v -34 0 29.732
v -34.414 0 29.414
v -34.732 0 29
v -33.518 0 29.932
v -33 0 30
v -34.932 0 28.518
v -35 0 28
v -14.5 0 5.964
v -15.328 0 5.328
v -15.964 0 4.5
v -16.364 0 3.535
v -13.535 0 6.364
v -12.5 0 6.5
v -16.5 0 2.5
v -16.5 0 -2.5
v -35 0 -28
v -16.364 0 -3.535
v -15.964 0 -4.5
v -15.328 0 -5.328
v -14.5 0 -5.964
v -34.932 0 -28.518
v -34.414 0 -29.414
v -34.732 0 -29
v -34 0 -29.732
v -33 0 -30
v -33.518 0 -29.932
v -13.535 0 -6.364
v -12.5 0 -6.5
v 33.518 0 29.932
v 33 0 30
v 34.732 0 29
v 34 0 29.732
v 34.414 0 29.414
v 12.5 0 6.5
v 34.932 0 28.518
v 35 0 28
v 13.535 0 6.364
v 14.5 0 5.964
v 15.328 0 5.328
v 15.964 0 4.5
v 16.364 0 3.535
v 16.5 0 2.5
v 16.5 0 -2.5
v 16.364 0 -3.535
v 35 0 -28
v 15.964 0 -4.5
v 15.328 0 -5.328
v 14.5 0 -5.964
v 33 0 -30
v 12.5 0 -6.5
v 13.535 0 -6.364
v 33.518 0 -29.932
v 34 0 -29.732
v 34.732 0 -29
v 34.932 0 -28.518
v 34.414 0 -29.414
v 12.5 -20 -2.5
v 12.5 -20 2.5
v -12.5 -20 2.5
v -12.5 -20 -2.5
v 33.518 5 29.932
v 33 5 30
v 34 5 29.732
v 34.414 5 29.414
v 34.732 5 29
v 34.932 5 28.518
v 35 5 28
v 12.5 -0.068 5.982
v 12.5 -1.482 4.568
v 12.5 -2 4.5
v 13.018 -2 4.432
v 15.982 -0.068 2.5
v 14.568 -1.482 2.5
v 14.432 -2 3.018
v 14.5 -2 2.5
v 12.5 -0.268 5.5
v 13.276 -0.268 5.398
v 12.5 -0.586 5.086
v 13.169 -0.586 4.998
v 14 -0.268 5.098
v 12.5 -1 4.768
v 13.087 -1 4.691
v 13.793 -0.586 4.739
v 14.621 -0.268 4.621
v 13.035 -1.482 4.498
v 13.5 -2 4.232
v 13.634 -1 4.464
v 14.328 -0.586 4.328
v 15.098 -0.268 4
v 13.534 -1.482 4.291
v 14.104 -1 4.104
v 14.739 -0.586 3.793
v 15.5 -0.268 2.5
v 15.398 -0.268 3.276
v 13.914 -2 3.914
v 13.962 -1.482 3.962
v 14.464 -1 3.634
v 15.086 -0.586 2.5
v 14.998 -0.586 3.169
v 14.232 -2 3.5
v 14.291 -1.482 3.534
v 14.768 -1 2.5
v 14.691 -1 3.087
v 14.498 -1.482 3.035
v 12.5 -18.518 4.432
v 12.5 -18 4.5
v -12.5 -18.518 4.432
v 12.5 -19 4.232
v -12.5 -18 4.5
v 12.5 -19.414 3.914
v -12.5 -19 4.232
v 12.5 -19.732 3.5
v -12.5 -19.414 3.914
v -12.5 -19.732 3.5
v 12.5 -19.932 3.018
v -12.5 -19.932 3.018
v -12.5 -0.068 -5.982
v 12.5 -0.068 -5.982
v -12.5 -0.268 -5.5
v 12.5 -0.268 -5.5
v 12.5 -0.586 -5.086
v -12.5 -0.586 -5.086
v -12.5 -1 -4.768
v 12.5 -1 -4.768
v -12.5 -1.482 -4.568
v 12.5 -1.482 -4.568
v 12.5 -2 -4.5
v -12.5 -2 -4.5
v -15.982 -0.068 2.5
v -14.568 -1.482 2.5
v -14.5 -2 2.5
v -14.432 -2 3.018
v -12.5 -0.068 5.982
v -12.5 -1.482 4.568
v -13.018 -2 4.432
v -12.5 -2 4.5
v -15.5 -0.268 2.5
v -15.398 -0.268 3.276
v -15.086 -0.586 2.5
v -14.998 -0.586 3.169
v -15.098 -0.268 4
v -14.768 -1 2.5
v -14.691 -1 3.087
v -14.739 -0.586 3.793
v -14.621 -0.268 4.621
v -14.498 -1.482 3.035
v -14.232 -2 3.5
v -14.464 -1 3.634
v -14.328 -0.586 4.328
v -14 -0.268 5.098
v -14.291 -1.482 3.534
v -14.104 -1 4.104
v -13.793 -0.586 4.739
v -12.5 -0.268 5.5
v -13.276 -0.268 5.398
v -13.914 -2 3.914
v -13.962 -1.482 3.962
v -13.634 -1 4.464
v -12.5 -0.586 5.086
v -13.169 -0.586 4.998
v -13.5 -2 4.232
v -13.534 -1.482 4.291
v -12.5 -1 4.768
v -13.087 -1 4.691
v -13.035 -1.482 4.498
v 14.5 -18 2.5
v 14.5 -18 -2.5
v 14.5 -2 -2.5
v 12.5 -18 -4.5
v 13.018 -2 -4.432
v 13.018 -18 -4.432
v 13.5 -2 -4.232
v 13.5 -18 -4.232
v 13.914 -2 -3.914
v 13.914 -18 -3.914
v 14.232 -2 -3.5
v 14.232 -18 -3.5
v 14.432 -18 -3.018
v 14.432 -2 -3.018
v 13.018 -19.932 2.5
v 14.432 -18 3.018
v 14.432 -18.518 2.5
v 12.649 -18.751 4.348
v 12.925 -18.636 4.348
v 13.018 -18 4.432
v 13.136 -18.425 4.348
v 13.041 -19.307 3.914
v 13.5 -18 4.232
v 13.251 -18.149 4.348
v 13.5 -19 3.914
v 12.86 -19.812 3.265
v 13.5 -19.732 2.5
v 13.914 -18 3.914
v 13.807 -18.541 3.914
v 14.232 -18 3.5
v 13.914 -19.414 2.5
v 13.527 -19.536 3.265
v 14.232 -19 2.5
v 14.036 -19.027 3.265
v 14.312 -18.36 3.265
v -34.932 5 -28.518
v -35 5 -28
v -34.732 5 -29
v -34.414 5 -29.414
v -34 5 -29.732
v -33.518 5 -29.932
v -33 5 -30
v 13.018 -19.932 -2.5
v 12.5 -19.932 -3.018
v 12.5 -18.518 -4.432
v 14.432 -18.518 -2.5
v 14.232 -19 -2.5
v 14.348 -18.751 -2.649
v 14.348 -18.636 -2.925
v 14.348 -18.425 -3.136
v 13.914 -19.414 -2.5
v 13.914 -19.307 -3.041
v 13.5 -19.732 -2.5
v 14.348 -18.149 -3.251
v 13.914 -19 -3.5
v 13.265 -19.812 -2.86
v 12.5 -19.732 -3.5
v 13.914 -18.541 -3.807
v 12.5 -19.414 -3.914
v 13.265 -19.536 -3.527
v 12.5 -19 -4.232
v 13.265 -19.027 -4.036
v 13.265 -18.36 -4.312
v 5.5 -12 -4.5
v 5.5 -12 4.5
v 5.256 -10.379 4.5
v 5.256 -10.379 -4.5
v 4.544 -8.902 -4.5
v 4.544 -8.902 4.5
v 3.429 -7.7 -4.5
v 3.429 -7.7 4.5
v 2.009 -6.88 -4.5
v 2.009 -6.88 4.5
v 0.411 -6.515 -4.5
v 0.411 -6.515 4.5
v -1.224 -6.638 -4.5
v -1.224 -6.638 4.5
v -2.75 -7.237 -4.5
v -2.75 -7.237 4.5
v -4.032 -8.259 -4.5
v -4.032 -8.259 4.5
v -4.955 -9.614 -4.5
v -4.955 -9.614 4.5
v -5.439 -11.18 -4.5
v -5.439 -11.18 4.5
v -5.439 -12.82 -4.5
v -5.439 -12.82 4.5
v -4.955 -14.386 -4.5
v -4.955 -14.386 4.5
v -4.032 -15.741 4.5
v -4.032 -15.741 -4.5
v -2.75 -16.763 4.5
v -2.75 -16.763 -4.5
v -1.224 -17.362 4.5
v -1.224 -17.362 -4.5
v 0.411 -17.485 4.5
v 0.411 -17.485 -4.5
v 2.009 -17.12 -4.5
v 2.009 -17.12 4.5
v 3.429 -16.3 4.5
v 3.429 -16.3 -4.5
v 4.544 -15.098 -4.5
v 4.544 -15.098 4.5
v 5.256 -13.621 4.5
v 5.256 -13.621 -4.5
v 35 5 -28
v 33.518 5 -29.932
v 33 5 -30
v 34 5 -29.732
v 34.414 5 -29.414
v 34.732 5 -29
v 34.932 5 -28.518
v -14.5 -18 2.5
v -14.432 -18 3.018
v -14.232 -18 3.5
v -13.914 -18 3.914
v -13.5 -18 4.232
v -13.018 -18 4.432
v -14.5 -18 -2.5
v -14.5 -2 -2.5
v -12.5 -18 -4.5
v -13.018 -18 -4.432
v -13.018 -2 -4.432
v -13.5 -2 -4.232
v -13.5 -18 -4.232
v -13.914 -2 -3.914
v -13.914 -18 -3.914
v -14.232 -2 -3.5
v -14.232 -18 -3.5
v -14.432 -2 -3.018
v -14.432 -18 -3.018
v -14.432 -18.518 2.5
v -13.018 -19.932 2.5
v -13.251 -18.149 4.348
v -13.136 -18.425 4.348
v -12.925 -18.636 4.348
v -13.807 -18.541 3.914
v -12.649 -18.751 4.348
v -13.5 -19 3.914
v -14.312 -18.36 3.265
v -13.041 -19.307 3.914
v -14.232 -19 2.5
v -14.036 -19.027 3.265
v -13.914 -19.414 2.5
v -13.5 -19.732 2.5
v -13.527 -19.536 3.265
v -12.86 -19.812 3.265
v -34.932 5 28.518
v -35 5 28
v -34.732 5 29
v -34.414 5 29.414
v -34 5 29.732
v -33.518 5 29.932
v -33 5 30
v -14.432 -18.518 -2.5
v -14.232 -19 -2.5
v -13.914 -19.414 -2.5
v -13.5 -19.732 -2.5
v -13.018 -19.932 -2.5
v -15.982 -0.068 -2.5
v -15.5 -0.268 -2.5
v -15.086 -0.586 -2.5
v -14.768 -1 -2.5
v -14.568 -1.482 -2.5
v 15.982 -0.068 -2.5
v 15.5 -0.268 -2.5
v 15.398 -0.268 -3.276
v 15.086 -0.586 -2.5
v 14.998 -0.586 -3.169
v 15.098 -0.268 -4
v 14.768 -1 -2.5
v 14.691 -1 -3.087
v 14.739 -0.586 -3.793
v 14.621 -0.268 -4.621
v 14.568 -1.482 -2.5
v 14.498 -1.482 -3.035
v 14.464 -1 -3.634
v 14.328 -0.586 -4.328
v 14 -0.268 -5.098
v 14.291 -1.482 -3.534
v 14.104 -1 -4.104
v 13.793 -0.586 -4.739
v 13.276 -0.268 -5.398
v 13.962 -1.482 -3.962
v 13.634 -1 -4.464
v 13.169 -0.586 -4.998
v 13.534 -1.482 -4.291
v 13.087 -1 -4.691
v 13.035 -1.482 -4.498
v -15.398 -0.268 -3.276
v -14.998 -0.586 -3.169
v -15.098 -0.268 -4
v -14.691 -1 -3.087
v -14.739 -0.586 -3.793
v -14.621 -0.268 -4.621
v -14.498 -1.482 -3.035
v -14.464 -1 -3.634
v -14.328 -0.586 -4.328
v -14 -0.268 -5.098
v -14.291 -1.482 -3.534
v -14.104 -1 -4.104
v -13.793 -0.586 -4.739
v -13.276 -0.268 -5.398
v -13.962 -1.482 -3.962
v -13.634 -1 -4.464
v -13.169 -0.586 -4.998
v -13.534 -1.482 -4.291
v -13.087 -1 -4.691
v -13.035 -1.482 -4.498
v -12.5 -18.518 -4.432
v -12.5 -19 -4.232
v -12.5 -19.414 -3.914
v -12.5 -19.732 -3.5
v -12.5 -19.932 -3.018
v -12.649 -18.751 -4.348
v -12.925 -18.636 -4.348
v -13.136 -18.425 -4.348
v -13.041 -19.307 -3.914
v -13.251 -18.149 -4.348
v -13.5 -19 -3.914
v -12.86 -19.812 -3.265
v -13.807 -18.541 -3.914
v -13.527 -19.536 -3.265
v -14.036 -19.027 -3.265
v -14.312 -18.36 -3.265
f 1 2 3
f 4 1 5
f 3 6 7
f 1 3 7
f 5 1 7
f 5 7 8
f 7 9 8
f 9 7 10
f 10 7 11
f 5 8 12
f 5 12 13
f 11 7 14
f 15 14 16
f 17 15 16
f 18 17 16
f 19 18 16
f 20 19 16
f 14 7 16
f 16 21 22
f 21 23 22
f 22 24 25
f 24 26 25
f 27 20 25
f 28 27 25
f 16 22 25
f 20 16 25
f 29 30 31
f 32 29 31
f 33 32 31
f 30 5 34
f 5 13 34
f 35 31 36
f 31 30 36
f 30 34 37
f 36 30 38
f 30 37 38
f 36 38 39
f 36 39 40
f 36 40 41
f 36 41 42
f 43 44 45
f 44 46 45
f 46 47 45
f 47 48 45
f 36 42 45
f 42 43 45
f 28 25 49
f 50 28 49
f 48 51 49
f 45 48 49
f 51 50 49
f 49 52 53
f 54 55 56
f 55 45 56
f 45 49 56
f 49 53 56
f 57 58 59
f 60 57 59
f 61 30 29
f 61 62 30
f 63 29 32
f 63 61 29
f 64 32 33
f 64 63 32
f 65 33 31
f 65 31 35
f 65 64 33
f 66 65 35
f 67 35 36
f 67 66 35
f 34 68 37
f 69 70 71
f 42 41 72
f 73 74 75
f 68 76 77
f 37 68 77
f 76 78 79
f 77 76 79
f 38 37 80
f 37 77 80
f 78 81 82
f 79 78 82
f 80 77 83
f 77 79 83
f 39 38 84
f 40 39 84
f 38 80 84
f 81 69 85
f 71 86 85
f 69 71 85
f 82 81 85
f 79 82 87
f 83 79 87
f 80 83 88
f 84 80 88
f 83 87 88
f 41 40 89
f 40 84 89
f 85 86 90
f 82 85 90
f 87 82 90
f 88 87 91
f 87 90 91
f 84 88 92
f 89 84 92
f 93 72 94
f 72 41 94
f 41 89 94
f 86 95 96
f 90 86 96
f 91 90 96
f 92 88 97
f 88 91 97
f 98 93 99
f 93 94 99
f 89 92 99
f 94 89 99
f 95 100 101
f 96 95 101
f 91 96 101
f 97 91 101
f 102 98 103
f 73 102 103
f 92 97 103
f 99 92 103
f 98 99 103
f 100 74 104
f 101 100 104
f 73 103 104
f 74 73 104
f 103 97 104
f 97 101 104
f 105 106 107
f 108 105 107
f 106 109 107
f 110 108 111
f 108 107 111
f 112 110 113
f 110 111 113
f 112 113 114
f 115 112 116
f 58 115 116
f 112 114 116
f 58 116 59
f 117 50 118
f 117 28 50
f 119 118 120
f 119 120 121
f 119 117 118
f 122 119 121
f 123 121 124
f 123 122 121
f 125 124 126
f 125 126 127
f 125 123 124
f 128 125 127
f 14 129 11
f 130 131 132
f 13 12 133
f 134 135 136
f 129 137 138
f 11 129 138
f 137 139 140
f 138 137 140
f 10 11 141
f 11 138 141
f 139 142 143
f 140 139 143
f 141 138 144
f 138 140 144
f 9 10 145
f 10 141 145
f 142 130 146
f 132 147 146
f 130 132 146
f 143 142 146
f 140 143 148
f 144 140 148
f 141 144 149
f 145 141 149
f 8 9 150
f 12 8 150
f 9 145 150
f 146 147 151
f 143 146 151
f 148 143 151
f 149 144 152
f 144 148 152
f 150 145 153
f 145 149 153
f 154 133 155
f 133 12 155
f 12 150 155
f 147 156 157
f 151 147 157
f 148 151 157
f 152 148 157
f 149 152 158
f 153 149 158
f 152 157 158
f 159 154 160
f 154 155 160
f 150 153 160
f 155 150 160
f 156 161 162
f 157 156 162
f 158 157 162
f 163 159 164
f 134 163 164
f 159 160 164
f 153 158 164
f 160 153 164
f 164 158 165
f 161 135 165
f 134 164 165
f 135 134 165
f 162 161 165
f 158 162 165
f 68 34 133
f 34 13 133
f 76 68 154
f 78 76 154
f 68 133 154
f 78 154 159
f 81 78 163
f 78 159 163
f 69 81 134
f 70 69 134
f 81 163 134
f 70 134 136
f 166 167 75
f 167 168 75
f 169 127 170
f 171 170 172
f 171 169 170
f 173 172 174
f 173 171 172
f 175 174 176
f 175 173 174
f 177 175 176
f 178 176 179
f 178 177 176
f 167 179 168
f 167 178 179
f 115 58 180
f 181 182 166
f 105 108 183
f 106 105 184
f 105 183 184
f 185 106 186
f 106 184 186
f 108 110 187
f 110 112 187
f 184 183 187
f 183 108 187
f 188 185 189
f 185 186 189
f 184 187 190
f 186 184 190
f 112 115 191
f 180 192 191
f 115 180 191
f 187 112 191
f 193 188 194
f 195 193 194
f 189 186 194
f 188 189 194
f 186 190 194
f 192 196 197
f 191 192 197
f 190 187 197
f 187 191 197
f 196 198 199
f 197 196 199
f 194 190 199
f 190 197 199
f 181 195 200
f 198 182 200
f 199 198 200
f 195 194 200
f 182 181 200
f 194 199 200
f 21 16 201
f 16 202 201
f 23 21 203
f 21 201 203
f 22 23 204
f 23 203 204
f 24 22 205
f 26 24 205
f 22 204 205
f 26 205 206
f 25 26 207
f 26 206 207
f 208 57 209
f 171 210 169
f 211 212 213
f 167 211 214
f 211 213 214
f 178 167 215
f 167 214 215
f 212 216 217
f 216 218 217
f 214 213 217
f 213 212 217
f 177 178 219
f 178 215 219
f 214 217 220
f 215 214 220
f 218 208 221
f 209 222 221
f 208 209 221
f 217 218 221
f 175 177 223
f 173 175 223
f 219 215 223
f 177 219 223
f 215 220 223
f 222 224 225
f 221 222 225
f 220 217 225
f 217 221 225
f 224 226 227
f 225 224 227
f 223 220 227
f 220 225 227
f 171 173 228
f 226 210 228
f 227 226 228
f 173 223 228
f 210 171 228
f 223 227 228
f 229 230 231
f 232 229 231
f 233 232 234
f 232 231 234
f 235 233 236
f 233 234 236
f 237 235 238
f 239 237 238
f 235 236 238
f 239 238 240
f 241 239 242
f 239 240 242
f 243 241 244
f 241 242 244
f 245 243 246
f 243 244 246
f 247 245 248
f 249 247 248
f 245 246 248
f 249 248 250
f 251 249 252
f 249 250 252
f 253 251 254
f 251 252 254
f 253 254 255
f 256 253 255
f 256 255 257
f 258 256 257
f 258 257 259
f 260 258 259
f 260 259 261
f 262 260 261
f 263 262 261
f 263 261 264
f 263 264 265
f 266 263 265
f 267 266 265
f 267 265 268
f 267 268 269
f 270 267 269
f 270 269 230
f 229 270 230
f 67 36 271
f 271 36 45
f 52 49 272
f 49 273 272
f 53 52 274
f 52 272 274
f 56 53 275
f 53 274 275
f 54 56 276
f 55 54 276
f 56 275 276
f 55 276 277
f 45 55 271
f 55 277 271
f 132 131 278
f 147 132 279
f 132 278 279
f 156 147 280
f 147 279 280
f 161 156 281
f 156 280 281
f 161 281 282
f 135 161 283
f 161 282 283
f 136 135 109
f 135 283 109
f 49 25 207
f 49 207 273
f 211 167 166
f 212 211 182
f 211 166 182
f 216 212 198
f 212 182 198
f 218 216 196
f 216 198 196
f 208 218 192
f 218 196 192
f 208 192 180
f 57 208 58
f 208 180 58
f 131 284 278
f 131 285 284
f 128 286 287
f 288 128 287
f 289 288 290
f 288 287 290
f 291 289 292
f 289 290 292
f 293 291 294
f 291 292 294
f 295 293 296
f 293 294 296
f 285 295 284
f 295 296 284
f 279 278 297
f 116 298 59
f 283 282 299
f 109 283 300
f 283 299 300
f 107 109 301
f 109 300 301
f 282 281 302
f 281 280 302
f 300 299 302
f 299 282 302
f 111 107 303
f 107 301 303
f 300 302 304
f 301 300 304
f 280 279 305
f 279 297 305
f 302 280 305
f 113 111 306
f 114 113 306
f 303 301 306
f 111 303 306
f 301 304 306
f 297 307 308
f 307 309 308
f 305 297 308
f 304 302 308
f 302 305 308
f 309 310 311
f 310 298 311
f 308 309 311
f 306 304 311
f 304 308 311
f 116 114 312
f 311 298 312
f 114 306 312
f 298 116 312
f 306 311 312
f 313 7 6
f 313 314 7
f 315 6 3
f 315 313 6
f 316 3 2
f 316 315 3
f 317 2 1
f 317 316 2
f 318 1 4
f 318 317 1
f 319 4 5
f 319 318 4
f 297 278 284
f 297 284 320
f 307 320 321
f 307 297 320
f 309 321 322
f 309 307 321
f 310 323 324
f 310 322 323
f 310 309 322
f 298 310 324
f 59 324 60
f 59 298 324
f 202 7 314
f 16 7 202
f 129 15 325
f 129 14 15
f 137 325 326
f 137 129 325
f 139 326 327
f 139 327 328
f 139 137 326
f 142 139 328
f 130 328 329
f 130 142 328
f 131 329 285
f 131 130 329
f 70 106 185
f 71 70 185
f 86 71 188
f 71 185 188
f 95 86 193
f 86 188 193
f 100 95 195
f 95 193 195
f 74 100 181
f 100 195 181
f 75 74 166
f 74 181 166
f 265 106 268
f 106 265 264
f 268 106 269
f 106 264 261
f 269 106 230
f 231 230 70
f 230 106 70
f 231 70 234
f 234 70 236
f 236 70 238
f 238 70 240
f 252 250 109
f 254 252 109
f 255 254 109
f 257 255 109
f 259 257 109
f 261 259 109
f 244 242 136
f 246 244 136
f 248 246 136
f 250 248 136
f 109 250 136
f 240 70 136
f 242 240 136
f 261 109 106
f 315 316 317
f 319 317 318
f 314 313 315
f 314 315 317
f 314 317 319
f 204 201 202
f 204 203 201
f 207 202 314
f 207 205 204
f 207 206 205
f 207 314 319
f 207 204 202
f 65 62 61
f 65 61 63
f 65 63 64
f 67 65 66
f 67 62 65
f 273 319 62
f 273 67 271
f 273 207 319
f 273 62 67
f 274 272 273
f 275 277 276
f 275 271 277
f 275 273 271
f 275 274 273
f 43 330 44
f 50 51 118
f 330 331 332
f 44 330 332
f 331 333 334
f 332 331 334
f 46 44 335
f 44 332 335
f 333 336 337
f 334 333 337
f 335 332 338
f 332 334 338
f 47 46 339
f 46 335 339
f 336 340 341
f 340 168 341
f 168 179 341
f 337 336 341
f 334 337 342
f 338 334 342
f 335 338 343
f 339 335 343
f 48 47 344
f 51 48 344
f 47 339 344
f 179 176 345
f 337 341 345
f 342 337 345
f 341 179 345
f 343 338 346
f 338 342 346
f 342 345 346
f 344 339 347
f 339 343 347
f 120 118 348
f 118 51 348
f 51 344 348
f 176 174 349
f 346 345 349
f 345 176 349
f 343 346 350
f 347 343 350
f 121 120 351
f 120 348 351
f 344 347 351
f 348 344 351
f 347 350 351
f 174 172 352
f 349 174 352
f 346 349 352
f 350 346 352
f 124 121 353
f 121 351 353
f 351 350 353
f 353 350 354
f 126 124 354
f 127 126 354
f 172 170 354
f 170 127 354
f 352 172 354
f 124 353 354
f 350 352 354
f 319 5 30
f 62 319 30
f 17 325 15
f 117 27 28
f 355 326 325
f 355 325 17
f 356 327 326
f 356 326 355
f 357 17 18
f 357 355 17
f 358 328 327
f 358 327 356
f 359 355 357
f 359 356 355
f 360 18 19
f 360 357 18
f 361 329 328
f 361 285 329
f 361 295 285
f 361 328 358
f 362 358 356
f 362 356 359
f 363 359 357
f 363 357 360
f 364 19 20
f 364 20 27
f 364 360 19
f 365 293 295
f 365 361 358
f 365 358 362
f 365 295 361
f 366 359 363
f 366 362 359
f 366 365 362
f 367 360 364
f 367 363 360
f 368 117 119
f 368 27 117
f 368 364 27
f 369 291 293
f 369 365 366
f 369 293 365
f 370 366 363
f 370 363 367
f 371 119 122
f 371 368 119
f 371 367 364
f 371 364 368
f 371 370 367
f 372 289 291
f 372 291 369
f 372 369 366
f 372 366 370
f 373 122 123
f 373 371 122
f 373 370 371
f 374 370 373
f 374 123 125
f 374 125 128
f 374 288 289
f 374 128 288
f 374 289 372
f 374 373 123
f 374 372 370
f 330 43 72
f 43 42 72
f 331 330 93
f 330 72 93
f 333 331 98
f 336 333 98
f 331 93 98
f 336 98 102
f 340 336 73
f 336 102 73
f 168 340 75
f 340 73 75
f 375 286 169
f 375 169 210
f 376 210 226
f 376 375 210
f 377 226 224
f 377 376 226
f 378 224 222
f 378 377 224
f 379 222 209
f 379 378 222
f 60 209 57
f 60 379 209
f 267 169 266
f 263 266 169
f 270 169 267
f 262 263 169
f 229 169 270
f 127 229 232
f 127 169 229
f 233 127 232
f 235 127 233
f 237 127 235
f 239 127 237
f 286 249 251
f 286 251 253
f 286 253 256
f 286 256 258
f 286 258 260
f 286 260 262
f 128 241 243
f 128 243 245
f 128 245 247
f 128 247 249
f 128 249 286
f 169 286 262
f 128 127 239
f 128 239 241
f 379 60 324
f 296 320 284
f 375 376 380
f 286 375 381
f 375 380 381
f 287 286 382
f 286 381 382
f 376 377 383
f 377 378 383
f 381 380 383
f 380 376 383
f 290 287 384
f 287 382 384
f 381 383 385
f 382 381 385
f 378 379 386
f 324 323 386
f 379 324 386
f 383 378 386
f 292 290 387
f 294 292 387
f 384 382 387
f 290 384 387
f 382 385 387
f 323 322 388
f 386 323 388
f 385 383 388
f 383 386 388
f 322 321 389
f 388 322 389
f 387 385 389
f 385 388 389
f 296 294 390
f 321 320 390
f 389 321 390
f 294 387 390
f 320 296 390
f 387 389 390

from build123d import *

# Parameters (mm, degrees)
SKETCH1_W            = 70
SKETCH1_H            = 60
BOSS_EXTRUDE2_DEPTH  = 5
SKETCH15_W           = 29
SKETCH15_H           = 9
BOSS_EXTRUDE13_DEPTH = 20
SKETCH16_R           = 5.5
CUT_EXTRUDE3_DEPTH   = 54.058929503
FILLET1_R            = 2


with BuildPart() as part:
    # Sketch1 → Boss-Extrude2 (new body)
    with BuildSketch(Plane(origin=(0, 0, 0), x_dir=(1, 0, 0), z_dir=(0, 1, 0))):
        Rectangle(SKETCH1_W, SKETCH1_H)
    extrude(amount=BOSS_EXTRUDE2_DEPTH)

    # Sketch15 → Boss-Extrude13 (add)
    with BuildSketch(Plane(origin=(0, 0, 0), x_dir=(-1, 0, 0), z_dir=(0, 1, 0))):
        Rectangle(SKETCH15_W, SKETCH15_H)
    extrude(amount=-BOSS_EXTRUDE13_DEPTH)

    # Sketch16 → Cut-Extrude3 (cut, through all)
    with BuildSketch(Plane.XY.offset(4.5)):
        with Locations((0, -12)):
            Circle(SKETCH16_R)
    extrude(amount=-CUT_EXTRUDE3_DEPTH, mode=Mode.SUBTRACT)

    # Fillet1
    fillet1_edges = [part.edges().sort_by_distance(p)[0] for p in [
        (-14.5, -20, 0),
        (-14.5, -10, 4.5),
        (0, -20, -4.5),
        (-14.5, -10, -4.5),
        (14.5, -20, 0),
        (14.5, -10, -4.5),
        (0, -20, 4.5),
        (14.5, -10, 4.5),
        (-14.5, 0, 0),
        (0, 0, 4.5),
        (14.5, 0, 0),
        (0, 0, -4.5),
        (35, 2.5, 30),
        (-35, 2.5, 30),
        (-35, 2.5, -30),
        (35, 2.5, -30),
    ]]
    fillet(fillet1_edges, radius=FILLET1_R)


solid = part.part
